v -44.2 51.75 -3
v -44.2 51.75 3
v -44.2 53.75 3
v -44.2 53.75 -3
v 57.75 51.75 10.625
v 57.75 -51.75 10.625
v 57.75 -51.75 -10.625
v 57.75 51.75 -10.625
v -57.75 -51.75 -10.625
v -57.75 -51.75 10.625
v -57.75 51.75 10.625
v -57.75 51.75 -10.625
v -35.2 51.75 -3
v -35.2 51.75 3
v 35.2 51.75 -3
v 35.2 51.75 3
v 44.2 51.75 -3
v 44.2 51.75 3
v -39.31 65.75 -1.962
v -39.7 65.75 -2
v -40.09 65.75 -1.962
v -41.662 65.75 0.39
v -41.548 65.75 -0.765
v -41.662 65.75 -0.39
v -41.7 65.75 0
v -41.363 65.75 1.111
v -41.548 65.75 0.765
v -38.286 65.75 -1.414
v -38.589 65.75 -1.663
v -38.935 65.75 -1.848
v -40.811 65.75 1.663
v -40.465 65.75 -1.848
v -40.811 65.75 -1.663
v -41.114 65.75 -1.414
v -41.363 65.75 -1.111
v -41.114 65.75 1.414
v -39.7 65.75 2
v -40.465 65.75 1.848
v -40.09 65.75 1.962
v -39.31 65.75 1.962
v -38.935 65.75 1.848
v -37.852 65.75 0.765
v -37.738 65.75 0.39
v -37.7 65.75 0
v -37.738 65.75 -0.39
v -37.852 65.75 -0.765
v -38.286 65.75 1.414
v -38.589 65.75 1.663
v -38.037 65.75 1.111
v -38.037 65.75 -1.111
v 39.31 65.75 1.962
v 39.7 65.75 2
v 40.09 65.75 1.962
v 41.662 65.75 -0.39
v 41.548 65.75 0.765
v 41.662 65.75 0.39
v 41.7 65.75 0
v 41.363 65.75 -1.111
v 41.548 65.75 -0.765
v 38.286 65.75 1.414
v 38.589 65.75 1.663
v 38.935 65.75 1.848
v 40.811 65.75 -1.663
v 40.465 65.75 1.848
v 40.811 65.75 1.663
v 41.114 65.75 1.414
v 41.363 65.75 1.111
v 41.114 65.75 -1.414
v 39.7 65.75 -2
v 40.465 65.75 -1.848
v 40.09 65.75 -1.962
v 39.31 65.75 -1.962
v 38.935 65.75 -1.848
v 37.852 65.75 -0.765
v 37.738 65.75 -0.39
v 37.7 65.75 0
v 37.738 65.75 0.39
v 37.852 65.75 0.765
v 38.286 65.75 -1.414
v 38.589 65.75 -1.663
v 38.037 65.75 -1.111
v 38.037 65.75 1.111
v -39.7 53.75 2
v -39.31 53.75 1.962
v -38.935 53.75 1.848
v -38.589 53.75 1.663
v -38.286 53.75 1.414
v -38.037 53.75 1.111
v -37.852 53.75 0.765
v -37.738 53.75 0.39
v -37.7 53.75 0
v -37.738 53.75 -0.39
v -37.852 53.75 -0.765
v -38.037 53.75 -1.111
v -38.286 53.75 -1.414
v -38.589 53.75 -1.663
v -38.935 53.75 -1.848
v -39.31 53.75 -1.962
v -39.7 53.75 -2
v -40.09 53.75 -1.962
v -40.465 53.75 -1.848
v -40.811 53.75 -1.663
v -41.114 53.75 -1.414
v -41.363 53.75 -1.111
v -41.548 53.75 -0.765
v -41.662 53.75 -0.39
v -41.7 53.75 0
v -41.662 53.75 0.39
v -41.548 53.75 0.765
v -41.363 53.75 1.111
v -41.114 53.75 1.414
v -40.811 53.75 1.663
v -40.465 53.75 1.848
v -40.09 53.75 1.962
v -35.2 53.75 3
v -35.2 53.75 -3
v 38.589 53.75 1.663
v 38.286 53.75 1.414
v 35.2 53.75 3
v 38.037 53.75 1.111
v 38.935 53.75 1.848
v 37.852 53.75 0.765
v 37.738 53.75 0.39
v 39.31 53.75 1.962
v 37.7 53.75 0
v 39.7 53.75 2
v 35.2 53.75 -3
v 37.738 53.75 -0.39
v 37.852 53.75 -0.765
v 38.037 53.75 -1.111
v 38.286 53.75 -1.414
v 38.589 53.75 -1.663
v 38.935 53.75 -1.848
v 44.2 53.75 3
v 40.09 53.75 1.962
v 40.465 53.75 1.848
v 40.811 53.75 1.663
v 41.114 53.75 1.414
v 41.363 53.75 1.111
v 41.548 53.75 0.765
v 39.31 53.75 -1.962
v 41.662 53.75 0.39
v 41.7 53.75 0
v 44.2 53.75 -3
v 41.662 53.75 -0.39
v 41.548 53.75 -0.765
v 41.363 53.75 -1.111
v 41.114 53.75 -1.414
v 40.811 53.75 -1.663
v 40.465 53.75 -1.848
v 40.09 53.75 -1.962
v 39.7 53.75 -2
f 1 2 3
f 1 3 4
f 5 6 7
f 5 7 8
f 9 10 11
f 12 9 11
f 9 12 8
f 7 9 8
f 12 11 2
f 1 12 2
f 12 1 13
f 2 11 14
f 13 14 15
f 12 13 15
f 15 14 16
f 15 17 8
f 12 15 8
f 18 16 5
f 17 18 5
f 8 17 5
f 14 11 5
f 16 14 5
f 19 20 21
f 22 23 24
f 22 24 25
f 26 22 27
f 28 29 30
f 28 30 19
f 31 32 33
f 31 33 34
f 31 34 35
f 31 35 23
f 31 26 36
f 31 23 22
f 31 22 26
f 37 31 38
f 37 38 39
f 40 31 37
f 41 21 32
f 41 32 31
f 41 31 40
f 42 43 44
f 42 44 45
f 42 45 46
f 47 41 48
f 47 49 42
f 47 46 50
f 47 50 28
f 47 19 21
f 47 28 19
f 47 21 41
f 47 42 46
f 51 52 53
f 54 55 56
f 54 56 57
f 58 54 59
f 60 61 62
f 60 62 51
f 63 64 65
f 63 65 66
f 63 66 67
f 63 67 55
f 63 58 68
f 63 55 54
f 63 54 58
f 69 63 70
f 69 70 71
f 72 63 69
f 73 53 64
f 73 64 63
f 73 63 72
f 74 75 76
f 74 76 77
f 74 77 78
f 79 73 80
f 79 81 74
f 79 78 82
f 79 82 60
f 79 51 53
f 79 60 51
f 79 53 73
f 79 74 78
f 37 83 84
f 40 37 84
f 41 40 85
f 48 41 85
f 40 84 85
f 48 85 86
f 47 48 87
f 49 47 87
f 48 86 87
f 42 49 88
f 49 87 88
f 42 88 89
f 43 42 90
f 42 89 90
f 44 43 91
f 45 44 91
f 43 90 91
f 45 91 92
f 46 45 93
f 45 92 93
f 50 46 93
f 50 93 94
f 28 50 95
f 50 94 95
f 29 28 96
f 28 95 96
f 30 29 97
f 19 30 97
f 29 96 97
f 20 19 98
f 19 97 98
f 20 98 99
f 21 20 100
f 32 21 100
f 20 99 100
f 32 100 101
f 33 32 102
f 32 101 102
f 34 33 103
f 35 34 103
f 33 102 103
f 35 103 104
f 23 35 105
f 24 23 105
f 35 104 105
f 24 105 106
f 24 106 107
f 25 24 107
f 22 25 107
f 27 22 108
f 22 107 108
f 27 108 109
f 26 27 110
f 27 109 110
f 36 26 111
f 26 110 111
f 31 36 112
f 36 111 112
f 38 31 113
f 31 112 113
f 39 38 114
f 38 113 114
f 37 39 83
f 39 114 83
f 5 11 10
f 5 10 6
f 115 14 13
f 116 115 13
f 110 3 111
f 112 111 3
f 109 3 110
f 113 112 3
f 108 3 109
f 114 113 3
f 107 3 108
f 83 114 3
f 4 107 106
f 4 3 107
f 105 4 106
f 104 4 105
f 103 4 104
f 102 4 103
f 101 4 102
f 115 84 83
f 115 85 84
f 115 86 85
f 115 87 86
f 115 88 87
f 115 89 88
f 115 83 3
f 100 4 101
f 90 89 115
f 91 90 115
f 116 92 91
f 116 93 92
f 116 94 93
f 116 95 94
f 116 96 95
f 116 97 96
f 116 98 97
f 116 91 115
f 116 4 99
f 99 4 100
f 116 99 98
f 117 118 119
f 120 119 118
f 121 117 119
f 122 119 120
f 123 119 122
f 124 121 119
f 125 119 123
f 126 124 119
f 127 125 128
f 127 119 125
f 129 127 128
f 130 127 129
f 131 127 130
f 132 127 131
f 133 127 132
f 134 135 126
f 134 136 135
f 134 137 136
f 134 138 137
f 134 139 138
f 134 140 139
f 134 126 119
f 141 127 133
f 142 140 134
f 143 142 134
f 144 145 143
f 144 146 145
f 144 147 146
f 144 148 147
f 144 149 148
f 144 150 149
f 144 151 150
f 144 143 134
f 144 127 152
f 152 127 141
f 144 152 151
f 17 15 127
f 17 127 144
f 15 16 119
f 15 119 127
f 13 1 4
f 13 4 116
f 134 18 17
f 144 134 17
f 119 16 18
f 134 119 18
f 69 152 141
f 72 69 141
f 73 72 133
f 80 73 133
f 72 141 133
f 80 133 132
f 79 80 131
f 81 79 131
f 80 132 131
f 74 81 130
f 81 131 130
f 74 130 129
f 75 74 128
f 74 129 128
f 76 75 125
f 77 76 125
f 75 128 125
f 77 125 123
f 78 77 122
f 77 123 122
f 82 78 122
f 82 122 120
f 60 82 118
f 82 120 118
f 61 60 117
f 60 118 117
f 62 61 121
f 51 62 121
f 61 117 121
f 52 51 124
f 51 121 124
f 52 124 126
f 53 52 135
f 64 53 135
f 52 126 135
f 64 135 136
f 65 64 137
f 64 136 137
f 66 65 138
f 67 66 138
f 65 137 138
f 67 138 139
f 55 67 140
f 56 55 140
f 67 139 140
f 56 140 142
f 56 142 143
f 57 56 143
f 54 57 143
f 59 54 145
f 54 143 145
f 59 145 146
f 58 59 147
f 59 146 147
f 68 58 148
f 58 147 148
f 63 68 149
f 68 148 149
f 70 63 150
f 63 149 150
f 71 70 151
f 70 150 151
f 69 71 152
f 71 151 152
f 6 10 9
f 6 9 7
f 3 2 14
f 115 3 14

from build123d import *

# Parameters (mm, degrees)
SKETCH1_W             = 115.5
SKETCH1_H             = 103.5
CELL_BODY_DEPTH       = 10.625
SKETCH2_W             = 9
SKETCH2_H             = 6
SCREW_TERMINALS_DEPTH = 2
SKETCH3_R             = 2
SCREWS_DEPTH          = 12


with BuildPart() as part:
    # Sketch1 → Cell Body (new, symmetric)
    with BuildSketch(Plane.XY):
        Rectangle(SKETCH1_W, SKETCH1_H)
    extrude(amount=CELL_BODY_DEPTH, both=True)

    # Sketch2 → Screw Terminals (add)
    with BuildSketch(Plane(origin=(0, 51.75, 0), x_dir=(1, 0, 0), z_dir=(0, 1, 0))):
        with Locations((-39.7, 0)):
            Rectangle(SKETCH2_W, SKETCH2_H)
        with Locations((39.7, 0)):
            Rectangle(SKETCH2_W, SKETCH2_H)
    extrude(amount=SCREW_TERMINALS_DEPTH)

    # Sketch3 → Screws (add)
    with BuildSketch(Plane(origin=(0, 53.75, 0), x_dir=(1, 0, 0), z_dir=(0, 1, 0))):
        with Locations((-39.7, 0)):
            Circle(SKETCH3_R)
        with Locations((39.7, 0)):
            Circle(SKETCH3_R)
    extrude(amount=SCREWS_DEPTH)


solid = part.part
